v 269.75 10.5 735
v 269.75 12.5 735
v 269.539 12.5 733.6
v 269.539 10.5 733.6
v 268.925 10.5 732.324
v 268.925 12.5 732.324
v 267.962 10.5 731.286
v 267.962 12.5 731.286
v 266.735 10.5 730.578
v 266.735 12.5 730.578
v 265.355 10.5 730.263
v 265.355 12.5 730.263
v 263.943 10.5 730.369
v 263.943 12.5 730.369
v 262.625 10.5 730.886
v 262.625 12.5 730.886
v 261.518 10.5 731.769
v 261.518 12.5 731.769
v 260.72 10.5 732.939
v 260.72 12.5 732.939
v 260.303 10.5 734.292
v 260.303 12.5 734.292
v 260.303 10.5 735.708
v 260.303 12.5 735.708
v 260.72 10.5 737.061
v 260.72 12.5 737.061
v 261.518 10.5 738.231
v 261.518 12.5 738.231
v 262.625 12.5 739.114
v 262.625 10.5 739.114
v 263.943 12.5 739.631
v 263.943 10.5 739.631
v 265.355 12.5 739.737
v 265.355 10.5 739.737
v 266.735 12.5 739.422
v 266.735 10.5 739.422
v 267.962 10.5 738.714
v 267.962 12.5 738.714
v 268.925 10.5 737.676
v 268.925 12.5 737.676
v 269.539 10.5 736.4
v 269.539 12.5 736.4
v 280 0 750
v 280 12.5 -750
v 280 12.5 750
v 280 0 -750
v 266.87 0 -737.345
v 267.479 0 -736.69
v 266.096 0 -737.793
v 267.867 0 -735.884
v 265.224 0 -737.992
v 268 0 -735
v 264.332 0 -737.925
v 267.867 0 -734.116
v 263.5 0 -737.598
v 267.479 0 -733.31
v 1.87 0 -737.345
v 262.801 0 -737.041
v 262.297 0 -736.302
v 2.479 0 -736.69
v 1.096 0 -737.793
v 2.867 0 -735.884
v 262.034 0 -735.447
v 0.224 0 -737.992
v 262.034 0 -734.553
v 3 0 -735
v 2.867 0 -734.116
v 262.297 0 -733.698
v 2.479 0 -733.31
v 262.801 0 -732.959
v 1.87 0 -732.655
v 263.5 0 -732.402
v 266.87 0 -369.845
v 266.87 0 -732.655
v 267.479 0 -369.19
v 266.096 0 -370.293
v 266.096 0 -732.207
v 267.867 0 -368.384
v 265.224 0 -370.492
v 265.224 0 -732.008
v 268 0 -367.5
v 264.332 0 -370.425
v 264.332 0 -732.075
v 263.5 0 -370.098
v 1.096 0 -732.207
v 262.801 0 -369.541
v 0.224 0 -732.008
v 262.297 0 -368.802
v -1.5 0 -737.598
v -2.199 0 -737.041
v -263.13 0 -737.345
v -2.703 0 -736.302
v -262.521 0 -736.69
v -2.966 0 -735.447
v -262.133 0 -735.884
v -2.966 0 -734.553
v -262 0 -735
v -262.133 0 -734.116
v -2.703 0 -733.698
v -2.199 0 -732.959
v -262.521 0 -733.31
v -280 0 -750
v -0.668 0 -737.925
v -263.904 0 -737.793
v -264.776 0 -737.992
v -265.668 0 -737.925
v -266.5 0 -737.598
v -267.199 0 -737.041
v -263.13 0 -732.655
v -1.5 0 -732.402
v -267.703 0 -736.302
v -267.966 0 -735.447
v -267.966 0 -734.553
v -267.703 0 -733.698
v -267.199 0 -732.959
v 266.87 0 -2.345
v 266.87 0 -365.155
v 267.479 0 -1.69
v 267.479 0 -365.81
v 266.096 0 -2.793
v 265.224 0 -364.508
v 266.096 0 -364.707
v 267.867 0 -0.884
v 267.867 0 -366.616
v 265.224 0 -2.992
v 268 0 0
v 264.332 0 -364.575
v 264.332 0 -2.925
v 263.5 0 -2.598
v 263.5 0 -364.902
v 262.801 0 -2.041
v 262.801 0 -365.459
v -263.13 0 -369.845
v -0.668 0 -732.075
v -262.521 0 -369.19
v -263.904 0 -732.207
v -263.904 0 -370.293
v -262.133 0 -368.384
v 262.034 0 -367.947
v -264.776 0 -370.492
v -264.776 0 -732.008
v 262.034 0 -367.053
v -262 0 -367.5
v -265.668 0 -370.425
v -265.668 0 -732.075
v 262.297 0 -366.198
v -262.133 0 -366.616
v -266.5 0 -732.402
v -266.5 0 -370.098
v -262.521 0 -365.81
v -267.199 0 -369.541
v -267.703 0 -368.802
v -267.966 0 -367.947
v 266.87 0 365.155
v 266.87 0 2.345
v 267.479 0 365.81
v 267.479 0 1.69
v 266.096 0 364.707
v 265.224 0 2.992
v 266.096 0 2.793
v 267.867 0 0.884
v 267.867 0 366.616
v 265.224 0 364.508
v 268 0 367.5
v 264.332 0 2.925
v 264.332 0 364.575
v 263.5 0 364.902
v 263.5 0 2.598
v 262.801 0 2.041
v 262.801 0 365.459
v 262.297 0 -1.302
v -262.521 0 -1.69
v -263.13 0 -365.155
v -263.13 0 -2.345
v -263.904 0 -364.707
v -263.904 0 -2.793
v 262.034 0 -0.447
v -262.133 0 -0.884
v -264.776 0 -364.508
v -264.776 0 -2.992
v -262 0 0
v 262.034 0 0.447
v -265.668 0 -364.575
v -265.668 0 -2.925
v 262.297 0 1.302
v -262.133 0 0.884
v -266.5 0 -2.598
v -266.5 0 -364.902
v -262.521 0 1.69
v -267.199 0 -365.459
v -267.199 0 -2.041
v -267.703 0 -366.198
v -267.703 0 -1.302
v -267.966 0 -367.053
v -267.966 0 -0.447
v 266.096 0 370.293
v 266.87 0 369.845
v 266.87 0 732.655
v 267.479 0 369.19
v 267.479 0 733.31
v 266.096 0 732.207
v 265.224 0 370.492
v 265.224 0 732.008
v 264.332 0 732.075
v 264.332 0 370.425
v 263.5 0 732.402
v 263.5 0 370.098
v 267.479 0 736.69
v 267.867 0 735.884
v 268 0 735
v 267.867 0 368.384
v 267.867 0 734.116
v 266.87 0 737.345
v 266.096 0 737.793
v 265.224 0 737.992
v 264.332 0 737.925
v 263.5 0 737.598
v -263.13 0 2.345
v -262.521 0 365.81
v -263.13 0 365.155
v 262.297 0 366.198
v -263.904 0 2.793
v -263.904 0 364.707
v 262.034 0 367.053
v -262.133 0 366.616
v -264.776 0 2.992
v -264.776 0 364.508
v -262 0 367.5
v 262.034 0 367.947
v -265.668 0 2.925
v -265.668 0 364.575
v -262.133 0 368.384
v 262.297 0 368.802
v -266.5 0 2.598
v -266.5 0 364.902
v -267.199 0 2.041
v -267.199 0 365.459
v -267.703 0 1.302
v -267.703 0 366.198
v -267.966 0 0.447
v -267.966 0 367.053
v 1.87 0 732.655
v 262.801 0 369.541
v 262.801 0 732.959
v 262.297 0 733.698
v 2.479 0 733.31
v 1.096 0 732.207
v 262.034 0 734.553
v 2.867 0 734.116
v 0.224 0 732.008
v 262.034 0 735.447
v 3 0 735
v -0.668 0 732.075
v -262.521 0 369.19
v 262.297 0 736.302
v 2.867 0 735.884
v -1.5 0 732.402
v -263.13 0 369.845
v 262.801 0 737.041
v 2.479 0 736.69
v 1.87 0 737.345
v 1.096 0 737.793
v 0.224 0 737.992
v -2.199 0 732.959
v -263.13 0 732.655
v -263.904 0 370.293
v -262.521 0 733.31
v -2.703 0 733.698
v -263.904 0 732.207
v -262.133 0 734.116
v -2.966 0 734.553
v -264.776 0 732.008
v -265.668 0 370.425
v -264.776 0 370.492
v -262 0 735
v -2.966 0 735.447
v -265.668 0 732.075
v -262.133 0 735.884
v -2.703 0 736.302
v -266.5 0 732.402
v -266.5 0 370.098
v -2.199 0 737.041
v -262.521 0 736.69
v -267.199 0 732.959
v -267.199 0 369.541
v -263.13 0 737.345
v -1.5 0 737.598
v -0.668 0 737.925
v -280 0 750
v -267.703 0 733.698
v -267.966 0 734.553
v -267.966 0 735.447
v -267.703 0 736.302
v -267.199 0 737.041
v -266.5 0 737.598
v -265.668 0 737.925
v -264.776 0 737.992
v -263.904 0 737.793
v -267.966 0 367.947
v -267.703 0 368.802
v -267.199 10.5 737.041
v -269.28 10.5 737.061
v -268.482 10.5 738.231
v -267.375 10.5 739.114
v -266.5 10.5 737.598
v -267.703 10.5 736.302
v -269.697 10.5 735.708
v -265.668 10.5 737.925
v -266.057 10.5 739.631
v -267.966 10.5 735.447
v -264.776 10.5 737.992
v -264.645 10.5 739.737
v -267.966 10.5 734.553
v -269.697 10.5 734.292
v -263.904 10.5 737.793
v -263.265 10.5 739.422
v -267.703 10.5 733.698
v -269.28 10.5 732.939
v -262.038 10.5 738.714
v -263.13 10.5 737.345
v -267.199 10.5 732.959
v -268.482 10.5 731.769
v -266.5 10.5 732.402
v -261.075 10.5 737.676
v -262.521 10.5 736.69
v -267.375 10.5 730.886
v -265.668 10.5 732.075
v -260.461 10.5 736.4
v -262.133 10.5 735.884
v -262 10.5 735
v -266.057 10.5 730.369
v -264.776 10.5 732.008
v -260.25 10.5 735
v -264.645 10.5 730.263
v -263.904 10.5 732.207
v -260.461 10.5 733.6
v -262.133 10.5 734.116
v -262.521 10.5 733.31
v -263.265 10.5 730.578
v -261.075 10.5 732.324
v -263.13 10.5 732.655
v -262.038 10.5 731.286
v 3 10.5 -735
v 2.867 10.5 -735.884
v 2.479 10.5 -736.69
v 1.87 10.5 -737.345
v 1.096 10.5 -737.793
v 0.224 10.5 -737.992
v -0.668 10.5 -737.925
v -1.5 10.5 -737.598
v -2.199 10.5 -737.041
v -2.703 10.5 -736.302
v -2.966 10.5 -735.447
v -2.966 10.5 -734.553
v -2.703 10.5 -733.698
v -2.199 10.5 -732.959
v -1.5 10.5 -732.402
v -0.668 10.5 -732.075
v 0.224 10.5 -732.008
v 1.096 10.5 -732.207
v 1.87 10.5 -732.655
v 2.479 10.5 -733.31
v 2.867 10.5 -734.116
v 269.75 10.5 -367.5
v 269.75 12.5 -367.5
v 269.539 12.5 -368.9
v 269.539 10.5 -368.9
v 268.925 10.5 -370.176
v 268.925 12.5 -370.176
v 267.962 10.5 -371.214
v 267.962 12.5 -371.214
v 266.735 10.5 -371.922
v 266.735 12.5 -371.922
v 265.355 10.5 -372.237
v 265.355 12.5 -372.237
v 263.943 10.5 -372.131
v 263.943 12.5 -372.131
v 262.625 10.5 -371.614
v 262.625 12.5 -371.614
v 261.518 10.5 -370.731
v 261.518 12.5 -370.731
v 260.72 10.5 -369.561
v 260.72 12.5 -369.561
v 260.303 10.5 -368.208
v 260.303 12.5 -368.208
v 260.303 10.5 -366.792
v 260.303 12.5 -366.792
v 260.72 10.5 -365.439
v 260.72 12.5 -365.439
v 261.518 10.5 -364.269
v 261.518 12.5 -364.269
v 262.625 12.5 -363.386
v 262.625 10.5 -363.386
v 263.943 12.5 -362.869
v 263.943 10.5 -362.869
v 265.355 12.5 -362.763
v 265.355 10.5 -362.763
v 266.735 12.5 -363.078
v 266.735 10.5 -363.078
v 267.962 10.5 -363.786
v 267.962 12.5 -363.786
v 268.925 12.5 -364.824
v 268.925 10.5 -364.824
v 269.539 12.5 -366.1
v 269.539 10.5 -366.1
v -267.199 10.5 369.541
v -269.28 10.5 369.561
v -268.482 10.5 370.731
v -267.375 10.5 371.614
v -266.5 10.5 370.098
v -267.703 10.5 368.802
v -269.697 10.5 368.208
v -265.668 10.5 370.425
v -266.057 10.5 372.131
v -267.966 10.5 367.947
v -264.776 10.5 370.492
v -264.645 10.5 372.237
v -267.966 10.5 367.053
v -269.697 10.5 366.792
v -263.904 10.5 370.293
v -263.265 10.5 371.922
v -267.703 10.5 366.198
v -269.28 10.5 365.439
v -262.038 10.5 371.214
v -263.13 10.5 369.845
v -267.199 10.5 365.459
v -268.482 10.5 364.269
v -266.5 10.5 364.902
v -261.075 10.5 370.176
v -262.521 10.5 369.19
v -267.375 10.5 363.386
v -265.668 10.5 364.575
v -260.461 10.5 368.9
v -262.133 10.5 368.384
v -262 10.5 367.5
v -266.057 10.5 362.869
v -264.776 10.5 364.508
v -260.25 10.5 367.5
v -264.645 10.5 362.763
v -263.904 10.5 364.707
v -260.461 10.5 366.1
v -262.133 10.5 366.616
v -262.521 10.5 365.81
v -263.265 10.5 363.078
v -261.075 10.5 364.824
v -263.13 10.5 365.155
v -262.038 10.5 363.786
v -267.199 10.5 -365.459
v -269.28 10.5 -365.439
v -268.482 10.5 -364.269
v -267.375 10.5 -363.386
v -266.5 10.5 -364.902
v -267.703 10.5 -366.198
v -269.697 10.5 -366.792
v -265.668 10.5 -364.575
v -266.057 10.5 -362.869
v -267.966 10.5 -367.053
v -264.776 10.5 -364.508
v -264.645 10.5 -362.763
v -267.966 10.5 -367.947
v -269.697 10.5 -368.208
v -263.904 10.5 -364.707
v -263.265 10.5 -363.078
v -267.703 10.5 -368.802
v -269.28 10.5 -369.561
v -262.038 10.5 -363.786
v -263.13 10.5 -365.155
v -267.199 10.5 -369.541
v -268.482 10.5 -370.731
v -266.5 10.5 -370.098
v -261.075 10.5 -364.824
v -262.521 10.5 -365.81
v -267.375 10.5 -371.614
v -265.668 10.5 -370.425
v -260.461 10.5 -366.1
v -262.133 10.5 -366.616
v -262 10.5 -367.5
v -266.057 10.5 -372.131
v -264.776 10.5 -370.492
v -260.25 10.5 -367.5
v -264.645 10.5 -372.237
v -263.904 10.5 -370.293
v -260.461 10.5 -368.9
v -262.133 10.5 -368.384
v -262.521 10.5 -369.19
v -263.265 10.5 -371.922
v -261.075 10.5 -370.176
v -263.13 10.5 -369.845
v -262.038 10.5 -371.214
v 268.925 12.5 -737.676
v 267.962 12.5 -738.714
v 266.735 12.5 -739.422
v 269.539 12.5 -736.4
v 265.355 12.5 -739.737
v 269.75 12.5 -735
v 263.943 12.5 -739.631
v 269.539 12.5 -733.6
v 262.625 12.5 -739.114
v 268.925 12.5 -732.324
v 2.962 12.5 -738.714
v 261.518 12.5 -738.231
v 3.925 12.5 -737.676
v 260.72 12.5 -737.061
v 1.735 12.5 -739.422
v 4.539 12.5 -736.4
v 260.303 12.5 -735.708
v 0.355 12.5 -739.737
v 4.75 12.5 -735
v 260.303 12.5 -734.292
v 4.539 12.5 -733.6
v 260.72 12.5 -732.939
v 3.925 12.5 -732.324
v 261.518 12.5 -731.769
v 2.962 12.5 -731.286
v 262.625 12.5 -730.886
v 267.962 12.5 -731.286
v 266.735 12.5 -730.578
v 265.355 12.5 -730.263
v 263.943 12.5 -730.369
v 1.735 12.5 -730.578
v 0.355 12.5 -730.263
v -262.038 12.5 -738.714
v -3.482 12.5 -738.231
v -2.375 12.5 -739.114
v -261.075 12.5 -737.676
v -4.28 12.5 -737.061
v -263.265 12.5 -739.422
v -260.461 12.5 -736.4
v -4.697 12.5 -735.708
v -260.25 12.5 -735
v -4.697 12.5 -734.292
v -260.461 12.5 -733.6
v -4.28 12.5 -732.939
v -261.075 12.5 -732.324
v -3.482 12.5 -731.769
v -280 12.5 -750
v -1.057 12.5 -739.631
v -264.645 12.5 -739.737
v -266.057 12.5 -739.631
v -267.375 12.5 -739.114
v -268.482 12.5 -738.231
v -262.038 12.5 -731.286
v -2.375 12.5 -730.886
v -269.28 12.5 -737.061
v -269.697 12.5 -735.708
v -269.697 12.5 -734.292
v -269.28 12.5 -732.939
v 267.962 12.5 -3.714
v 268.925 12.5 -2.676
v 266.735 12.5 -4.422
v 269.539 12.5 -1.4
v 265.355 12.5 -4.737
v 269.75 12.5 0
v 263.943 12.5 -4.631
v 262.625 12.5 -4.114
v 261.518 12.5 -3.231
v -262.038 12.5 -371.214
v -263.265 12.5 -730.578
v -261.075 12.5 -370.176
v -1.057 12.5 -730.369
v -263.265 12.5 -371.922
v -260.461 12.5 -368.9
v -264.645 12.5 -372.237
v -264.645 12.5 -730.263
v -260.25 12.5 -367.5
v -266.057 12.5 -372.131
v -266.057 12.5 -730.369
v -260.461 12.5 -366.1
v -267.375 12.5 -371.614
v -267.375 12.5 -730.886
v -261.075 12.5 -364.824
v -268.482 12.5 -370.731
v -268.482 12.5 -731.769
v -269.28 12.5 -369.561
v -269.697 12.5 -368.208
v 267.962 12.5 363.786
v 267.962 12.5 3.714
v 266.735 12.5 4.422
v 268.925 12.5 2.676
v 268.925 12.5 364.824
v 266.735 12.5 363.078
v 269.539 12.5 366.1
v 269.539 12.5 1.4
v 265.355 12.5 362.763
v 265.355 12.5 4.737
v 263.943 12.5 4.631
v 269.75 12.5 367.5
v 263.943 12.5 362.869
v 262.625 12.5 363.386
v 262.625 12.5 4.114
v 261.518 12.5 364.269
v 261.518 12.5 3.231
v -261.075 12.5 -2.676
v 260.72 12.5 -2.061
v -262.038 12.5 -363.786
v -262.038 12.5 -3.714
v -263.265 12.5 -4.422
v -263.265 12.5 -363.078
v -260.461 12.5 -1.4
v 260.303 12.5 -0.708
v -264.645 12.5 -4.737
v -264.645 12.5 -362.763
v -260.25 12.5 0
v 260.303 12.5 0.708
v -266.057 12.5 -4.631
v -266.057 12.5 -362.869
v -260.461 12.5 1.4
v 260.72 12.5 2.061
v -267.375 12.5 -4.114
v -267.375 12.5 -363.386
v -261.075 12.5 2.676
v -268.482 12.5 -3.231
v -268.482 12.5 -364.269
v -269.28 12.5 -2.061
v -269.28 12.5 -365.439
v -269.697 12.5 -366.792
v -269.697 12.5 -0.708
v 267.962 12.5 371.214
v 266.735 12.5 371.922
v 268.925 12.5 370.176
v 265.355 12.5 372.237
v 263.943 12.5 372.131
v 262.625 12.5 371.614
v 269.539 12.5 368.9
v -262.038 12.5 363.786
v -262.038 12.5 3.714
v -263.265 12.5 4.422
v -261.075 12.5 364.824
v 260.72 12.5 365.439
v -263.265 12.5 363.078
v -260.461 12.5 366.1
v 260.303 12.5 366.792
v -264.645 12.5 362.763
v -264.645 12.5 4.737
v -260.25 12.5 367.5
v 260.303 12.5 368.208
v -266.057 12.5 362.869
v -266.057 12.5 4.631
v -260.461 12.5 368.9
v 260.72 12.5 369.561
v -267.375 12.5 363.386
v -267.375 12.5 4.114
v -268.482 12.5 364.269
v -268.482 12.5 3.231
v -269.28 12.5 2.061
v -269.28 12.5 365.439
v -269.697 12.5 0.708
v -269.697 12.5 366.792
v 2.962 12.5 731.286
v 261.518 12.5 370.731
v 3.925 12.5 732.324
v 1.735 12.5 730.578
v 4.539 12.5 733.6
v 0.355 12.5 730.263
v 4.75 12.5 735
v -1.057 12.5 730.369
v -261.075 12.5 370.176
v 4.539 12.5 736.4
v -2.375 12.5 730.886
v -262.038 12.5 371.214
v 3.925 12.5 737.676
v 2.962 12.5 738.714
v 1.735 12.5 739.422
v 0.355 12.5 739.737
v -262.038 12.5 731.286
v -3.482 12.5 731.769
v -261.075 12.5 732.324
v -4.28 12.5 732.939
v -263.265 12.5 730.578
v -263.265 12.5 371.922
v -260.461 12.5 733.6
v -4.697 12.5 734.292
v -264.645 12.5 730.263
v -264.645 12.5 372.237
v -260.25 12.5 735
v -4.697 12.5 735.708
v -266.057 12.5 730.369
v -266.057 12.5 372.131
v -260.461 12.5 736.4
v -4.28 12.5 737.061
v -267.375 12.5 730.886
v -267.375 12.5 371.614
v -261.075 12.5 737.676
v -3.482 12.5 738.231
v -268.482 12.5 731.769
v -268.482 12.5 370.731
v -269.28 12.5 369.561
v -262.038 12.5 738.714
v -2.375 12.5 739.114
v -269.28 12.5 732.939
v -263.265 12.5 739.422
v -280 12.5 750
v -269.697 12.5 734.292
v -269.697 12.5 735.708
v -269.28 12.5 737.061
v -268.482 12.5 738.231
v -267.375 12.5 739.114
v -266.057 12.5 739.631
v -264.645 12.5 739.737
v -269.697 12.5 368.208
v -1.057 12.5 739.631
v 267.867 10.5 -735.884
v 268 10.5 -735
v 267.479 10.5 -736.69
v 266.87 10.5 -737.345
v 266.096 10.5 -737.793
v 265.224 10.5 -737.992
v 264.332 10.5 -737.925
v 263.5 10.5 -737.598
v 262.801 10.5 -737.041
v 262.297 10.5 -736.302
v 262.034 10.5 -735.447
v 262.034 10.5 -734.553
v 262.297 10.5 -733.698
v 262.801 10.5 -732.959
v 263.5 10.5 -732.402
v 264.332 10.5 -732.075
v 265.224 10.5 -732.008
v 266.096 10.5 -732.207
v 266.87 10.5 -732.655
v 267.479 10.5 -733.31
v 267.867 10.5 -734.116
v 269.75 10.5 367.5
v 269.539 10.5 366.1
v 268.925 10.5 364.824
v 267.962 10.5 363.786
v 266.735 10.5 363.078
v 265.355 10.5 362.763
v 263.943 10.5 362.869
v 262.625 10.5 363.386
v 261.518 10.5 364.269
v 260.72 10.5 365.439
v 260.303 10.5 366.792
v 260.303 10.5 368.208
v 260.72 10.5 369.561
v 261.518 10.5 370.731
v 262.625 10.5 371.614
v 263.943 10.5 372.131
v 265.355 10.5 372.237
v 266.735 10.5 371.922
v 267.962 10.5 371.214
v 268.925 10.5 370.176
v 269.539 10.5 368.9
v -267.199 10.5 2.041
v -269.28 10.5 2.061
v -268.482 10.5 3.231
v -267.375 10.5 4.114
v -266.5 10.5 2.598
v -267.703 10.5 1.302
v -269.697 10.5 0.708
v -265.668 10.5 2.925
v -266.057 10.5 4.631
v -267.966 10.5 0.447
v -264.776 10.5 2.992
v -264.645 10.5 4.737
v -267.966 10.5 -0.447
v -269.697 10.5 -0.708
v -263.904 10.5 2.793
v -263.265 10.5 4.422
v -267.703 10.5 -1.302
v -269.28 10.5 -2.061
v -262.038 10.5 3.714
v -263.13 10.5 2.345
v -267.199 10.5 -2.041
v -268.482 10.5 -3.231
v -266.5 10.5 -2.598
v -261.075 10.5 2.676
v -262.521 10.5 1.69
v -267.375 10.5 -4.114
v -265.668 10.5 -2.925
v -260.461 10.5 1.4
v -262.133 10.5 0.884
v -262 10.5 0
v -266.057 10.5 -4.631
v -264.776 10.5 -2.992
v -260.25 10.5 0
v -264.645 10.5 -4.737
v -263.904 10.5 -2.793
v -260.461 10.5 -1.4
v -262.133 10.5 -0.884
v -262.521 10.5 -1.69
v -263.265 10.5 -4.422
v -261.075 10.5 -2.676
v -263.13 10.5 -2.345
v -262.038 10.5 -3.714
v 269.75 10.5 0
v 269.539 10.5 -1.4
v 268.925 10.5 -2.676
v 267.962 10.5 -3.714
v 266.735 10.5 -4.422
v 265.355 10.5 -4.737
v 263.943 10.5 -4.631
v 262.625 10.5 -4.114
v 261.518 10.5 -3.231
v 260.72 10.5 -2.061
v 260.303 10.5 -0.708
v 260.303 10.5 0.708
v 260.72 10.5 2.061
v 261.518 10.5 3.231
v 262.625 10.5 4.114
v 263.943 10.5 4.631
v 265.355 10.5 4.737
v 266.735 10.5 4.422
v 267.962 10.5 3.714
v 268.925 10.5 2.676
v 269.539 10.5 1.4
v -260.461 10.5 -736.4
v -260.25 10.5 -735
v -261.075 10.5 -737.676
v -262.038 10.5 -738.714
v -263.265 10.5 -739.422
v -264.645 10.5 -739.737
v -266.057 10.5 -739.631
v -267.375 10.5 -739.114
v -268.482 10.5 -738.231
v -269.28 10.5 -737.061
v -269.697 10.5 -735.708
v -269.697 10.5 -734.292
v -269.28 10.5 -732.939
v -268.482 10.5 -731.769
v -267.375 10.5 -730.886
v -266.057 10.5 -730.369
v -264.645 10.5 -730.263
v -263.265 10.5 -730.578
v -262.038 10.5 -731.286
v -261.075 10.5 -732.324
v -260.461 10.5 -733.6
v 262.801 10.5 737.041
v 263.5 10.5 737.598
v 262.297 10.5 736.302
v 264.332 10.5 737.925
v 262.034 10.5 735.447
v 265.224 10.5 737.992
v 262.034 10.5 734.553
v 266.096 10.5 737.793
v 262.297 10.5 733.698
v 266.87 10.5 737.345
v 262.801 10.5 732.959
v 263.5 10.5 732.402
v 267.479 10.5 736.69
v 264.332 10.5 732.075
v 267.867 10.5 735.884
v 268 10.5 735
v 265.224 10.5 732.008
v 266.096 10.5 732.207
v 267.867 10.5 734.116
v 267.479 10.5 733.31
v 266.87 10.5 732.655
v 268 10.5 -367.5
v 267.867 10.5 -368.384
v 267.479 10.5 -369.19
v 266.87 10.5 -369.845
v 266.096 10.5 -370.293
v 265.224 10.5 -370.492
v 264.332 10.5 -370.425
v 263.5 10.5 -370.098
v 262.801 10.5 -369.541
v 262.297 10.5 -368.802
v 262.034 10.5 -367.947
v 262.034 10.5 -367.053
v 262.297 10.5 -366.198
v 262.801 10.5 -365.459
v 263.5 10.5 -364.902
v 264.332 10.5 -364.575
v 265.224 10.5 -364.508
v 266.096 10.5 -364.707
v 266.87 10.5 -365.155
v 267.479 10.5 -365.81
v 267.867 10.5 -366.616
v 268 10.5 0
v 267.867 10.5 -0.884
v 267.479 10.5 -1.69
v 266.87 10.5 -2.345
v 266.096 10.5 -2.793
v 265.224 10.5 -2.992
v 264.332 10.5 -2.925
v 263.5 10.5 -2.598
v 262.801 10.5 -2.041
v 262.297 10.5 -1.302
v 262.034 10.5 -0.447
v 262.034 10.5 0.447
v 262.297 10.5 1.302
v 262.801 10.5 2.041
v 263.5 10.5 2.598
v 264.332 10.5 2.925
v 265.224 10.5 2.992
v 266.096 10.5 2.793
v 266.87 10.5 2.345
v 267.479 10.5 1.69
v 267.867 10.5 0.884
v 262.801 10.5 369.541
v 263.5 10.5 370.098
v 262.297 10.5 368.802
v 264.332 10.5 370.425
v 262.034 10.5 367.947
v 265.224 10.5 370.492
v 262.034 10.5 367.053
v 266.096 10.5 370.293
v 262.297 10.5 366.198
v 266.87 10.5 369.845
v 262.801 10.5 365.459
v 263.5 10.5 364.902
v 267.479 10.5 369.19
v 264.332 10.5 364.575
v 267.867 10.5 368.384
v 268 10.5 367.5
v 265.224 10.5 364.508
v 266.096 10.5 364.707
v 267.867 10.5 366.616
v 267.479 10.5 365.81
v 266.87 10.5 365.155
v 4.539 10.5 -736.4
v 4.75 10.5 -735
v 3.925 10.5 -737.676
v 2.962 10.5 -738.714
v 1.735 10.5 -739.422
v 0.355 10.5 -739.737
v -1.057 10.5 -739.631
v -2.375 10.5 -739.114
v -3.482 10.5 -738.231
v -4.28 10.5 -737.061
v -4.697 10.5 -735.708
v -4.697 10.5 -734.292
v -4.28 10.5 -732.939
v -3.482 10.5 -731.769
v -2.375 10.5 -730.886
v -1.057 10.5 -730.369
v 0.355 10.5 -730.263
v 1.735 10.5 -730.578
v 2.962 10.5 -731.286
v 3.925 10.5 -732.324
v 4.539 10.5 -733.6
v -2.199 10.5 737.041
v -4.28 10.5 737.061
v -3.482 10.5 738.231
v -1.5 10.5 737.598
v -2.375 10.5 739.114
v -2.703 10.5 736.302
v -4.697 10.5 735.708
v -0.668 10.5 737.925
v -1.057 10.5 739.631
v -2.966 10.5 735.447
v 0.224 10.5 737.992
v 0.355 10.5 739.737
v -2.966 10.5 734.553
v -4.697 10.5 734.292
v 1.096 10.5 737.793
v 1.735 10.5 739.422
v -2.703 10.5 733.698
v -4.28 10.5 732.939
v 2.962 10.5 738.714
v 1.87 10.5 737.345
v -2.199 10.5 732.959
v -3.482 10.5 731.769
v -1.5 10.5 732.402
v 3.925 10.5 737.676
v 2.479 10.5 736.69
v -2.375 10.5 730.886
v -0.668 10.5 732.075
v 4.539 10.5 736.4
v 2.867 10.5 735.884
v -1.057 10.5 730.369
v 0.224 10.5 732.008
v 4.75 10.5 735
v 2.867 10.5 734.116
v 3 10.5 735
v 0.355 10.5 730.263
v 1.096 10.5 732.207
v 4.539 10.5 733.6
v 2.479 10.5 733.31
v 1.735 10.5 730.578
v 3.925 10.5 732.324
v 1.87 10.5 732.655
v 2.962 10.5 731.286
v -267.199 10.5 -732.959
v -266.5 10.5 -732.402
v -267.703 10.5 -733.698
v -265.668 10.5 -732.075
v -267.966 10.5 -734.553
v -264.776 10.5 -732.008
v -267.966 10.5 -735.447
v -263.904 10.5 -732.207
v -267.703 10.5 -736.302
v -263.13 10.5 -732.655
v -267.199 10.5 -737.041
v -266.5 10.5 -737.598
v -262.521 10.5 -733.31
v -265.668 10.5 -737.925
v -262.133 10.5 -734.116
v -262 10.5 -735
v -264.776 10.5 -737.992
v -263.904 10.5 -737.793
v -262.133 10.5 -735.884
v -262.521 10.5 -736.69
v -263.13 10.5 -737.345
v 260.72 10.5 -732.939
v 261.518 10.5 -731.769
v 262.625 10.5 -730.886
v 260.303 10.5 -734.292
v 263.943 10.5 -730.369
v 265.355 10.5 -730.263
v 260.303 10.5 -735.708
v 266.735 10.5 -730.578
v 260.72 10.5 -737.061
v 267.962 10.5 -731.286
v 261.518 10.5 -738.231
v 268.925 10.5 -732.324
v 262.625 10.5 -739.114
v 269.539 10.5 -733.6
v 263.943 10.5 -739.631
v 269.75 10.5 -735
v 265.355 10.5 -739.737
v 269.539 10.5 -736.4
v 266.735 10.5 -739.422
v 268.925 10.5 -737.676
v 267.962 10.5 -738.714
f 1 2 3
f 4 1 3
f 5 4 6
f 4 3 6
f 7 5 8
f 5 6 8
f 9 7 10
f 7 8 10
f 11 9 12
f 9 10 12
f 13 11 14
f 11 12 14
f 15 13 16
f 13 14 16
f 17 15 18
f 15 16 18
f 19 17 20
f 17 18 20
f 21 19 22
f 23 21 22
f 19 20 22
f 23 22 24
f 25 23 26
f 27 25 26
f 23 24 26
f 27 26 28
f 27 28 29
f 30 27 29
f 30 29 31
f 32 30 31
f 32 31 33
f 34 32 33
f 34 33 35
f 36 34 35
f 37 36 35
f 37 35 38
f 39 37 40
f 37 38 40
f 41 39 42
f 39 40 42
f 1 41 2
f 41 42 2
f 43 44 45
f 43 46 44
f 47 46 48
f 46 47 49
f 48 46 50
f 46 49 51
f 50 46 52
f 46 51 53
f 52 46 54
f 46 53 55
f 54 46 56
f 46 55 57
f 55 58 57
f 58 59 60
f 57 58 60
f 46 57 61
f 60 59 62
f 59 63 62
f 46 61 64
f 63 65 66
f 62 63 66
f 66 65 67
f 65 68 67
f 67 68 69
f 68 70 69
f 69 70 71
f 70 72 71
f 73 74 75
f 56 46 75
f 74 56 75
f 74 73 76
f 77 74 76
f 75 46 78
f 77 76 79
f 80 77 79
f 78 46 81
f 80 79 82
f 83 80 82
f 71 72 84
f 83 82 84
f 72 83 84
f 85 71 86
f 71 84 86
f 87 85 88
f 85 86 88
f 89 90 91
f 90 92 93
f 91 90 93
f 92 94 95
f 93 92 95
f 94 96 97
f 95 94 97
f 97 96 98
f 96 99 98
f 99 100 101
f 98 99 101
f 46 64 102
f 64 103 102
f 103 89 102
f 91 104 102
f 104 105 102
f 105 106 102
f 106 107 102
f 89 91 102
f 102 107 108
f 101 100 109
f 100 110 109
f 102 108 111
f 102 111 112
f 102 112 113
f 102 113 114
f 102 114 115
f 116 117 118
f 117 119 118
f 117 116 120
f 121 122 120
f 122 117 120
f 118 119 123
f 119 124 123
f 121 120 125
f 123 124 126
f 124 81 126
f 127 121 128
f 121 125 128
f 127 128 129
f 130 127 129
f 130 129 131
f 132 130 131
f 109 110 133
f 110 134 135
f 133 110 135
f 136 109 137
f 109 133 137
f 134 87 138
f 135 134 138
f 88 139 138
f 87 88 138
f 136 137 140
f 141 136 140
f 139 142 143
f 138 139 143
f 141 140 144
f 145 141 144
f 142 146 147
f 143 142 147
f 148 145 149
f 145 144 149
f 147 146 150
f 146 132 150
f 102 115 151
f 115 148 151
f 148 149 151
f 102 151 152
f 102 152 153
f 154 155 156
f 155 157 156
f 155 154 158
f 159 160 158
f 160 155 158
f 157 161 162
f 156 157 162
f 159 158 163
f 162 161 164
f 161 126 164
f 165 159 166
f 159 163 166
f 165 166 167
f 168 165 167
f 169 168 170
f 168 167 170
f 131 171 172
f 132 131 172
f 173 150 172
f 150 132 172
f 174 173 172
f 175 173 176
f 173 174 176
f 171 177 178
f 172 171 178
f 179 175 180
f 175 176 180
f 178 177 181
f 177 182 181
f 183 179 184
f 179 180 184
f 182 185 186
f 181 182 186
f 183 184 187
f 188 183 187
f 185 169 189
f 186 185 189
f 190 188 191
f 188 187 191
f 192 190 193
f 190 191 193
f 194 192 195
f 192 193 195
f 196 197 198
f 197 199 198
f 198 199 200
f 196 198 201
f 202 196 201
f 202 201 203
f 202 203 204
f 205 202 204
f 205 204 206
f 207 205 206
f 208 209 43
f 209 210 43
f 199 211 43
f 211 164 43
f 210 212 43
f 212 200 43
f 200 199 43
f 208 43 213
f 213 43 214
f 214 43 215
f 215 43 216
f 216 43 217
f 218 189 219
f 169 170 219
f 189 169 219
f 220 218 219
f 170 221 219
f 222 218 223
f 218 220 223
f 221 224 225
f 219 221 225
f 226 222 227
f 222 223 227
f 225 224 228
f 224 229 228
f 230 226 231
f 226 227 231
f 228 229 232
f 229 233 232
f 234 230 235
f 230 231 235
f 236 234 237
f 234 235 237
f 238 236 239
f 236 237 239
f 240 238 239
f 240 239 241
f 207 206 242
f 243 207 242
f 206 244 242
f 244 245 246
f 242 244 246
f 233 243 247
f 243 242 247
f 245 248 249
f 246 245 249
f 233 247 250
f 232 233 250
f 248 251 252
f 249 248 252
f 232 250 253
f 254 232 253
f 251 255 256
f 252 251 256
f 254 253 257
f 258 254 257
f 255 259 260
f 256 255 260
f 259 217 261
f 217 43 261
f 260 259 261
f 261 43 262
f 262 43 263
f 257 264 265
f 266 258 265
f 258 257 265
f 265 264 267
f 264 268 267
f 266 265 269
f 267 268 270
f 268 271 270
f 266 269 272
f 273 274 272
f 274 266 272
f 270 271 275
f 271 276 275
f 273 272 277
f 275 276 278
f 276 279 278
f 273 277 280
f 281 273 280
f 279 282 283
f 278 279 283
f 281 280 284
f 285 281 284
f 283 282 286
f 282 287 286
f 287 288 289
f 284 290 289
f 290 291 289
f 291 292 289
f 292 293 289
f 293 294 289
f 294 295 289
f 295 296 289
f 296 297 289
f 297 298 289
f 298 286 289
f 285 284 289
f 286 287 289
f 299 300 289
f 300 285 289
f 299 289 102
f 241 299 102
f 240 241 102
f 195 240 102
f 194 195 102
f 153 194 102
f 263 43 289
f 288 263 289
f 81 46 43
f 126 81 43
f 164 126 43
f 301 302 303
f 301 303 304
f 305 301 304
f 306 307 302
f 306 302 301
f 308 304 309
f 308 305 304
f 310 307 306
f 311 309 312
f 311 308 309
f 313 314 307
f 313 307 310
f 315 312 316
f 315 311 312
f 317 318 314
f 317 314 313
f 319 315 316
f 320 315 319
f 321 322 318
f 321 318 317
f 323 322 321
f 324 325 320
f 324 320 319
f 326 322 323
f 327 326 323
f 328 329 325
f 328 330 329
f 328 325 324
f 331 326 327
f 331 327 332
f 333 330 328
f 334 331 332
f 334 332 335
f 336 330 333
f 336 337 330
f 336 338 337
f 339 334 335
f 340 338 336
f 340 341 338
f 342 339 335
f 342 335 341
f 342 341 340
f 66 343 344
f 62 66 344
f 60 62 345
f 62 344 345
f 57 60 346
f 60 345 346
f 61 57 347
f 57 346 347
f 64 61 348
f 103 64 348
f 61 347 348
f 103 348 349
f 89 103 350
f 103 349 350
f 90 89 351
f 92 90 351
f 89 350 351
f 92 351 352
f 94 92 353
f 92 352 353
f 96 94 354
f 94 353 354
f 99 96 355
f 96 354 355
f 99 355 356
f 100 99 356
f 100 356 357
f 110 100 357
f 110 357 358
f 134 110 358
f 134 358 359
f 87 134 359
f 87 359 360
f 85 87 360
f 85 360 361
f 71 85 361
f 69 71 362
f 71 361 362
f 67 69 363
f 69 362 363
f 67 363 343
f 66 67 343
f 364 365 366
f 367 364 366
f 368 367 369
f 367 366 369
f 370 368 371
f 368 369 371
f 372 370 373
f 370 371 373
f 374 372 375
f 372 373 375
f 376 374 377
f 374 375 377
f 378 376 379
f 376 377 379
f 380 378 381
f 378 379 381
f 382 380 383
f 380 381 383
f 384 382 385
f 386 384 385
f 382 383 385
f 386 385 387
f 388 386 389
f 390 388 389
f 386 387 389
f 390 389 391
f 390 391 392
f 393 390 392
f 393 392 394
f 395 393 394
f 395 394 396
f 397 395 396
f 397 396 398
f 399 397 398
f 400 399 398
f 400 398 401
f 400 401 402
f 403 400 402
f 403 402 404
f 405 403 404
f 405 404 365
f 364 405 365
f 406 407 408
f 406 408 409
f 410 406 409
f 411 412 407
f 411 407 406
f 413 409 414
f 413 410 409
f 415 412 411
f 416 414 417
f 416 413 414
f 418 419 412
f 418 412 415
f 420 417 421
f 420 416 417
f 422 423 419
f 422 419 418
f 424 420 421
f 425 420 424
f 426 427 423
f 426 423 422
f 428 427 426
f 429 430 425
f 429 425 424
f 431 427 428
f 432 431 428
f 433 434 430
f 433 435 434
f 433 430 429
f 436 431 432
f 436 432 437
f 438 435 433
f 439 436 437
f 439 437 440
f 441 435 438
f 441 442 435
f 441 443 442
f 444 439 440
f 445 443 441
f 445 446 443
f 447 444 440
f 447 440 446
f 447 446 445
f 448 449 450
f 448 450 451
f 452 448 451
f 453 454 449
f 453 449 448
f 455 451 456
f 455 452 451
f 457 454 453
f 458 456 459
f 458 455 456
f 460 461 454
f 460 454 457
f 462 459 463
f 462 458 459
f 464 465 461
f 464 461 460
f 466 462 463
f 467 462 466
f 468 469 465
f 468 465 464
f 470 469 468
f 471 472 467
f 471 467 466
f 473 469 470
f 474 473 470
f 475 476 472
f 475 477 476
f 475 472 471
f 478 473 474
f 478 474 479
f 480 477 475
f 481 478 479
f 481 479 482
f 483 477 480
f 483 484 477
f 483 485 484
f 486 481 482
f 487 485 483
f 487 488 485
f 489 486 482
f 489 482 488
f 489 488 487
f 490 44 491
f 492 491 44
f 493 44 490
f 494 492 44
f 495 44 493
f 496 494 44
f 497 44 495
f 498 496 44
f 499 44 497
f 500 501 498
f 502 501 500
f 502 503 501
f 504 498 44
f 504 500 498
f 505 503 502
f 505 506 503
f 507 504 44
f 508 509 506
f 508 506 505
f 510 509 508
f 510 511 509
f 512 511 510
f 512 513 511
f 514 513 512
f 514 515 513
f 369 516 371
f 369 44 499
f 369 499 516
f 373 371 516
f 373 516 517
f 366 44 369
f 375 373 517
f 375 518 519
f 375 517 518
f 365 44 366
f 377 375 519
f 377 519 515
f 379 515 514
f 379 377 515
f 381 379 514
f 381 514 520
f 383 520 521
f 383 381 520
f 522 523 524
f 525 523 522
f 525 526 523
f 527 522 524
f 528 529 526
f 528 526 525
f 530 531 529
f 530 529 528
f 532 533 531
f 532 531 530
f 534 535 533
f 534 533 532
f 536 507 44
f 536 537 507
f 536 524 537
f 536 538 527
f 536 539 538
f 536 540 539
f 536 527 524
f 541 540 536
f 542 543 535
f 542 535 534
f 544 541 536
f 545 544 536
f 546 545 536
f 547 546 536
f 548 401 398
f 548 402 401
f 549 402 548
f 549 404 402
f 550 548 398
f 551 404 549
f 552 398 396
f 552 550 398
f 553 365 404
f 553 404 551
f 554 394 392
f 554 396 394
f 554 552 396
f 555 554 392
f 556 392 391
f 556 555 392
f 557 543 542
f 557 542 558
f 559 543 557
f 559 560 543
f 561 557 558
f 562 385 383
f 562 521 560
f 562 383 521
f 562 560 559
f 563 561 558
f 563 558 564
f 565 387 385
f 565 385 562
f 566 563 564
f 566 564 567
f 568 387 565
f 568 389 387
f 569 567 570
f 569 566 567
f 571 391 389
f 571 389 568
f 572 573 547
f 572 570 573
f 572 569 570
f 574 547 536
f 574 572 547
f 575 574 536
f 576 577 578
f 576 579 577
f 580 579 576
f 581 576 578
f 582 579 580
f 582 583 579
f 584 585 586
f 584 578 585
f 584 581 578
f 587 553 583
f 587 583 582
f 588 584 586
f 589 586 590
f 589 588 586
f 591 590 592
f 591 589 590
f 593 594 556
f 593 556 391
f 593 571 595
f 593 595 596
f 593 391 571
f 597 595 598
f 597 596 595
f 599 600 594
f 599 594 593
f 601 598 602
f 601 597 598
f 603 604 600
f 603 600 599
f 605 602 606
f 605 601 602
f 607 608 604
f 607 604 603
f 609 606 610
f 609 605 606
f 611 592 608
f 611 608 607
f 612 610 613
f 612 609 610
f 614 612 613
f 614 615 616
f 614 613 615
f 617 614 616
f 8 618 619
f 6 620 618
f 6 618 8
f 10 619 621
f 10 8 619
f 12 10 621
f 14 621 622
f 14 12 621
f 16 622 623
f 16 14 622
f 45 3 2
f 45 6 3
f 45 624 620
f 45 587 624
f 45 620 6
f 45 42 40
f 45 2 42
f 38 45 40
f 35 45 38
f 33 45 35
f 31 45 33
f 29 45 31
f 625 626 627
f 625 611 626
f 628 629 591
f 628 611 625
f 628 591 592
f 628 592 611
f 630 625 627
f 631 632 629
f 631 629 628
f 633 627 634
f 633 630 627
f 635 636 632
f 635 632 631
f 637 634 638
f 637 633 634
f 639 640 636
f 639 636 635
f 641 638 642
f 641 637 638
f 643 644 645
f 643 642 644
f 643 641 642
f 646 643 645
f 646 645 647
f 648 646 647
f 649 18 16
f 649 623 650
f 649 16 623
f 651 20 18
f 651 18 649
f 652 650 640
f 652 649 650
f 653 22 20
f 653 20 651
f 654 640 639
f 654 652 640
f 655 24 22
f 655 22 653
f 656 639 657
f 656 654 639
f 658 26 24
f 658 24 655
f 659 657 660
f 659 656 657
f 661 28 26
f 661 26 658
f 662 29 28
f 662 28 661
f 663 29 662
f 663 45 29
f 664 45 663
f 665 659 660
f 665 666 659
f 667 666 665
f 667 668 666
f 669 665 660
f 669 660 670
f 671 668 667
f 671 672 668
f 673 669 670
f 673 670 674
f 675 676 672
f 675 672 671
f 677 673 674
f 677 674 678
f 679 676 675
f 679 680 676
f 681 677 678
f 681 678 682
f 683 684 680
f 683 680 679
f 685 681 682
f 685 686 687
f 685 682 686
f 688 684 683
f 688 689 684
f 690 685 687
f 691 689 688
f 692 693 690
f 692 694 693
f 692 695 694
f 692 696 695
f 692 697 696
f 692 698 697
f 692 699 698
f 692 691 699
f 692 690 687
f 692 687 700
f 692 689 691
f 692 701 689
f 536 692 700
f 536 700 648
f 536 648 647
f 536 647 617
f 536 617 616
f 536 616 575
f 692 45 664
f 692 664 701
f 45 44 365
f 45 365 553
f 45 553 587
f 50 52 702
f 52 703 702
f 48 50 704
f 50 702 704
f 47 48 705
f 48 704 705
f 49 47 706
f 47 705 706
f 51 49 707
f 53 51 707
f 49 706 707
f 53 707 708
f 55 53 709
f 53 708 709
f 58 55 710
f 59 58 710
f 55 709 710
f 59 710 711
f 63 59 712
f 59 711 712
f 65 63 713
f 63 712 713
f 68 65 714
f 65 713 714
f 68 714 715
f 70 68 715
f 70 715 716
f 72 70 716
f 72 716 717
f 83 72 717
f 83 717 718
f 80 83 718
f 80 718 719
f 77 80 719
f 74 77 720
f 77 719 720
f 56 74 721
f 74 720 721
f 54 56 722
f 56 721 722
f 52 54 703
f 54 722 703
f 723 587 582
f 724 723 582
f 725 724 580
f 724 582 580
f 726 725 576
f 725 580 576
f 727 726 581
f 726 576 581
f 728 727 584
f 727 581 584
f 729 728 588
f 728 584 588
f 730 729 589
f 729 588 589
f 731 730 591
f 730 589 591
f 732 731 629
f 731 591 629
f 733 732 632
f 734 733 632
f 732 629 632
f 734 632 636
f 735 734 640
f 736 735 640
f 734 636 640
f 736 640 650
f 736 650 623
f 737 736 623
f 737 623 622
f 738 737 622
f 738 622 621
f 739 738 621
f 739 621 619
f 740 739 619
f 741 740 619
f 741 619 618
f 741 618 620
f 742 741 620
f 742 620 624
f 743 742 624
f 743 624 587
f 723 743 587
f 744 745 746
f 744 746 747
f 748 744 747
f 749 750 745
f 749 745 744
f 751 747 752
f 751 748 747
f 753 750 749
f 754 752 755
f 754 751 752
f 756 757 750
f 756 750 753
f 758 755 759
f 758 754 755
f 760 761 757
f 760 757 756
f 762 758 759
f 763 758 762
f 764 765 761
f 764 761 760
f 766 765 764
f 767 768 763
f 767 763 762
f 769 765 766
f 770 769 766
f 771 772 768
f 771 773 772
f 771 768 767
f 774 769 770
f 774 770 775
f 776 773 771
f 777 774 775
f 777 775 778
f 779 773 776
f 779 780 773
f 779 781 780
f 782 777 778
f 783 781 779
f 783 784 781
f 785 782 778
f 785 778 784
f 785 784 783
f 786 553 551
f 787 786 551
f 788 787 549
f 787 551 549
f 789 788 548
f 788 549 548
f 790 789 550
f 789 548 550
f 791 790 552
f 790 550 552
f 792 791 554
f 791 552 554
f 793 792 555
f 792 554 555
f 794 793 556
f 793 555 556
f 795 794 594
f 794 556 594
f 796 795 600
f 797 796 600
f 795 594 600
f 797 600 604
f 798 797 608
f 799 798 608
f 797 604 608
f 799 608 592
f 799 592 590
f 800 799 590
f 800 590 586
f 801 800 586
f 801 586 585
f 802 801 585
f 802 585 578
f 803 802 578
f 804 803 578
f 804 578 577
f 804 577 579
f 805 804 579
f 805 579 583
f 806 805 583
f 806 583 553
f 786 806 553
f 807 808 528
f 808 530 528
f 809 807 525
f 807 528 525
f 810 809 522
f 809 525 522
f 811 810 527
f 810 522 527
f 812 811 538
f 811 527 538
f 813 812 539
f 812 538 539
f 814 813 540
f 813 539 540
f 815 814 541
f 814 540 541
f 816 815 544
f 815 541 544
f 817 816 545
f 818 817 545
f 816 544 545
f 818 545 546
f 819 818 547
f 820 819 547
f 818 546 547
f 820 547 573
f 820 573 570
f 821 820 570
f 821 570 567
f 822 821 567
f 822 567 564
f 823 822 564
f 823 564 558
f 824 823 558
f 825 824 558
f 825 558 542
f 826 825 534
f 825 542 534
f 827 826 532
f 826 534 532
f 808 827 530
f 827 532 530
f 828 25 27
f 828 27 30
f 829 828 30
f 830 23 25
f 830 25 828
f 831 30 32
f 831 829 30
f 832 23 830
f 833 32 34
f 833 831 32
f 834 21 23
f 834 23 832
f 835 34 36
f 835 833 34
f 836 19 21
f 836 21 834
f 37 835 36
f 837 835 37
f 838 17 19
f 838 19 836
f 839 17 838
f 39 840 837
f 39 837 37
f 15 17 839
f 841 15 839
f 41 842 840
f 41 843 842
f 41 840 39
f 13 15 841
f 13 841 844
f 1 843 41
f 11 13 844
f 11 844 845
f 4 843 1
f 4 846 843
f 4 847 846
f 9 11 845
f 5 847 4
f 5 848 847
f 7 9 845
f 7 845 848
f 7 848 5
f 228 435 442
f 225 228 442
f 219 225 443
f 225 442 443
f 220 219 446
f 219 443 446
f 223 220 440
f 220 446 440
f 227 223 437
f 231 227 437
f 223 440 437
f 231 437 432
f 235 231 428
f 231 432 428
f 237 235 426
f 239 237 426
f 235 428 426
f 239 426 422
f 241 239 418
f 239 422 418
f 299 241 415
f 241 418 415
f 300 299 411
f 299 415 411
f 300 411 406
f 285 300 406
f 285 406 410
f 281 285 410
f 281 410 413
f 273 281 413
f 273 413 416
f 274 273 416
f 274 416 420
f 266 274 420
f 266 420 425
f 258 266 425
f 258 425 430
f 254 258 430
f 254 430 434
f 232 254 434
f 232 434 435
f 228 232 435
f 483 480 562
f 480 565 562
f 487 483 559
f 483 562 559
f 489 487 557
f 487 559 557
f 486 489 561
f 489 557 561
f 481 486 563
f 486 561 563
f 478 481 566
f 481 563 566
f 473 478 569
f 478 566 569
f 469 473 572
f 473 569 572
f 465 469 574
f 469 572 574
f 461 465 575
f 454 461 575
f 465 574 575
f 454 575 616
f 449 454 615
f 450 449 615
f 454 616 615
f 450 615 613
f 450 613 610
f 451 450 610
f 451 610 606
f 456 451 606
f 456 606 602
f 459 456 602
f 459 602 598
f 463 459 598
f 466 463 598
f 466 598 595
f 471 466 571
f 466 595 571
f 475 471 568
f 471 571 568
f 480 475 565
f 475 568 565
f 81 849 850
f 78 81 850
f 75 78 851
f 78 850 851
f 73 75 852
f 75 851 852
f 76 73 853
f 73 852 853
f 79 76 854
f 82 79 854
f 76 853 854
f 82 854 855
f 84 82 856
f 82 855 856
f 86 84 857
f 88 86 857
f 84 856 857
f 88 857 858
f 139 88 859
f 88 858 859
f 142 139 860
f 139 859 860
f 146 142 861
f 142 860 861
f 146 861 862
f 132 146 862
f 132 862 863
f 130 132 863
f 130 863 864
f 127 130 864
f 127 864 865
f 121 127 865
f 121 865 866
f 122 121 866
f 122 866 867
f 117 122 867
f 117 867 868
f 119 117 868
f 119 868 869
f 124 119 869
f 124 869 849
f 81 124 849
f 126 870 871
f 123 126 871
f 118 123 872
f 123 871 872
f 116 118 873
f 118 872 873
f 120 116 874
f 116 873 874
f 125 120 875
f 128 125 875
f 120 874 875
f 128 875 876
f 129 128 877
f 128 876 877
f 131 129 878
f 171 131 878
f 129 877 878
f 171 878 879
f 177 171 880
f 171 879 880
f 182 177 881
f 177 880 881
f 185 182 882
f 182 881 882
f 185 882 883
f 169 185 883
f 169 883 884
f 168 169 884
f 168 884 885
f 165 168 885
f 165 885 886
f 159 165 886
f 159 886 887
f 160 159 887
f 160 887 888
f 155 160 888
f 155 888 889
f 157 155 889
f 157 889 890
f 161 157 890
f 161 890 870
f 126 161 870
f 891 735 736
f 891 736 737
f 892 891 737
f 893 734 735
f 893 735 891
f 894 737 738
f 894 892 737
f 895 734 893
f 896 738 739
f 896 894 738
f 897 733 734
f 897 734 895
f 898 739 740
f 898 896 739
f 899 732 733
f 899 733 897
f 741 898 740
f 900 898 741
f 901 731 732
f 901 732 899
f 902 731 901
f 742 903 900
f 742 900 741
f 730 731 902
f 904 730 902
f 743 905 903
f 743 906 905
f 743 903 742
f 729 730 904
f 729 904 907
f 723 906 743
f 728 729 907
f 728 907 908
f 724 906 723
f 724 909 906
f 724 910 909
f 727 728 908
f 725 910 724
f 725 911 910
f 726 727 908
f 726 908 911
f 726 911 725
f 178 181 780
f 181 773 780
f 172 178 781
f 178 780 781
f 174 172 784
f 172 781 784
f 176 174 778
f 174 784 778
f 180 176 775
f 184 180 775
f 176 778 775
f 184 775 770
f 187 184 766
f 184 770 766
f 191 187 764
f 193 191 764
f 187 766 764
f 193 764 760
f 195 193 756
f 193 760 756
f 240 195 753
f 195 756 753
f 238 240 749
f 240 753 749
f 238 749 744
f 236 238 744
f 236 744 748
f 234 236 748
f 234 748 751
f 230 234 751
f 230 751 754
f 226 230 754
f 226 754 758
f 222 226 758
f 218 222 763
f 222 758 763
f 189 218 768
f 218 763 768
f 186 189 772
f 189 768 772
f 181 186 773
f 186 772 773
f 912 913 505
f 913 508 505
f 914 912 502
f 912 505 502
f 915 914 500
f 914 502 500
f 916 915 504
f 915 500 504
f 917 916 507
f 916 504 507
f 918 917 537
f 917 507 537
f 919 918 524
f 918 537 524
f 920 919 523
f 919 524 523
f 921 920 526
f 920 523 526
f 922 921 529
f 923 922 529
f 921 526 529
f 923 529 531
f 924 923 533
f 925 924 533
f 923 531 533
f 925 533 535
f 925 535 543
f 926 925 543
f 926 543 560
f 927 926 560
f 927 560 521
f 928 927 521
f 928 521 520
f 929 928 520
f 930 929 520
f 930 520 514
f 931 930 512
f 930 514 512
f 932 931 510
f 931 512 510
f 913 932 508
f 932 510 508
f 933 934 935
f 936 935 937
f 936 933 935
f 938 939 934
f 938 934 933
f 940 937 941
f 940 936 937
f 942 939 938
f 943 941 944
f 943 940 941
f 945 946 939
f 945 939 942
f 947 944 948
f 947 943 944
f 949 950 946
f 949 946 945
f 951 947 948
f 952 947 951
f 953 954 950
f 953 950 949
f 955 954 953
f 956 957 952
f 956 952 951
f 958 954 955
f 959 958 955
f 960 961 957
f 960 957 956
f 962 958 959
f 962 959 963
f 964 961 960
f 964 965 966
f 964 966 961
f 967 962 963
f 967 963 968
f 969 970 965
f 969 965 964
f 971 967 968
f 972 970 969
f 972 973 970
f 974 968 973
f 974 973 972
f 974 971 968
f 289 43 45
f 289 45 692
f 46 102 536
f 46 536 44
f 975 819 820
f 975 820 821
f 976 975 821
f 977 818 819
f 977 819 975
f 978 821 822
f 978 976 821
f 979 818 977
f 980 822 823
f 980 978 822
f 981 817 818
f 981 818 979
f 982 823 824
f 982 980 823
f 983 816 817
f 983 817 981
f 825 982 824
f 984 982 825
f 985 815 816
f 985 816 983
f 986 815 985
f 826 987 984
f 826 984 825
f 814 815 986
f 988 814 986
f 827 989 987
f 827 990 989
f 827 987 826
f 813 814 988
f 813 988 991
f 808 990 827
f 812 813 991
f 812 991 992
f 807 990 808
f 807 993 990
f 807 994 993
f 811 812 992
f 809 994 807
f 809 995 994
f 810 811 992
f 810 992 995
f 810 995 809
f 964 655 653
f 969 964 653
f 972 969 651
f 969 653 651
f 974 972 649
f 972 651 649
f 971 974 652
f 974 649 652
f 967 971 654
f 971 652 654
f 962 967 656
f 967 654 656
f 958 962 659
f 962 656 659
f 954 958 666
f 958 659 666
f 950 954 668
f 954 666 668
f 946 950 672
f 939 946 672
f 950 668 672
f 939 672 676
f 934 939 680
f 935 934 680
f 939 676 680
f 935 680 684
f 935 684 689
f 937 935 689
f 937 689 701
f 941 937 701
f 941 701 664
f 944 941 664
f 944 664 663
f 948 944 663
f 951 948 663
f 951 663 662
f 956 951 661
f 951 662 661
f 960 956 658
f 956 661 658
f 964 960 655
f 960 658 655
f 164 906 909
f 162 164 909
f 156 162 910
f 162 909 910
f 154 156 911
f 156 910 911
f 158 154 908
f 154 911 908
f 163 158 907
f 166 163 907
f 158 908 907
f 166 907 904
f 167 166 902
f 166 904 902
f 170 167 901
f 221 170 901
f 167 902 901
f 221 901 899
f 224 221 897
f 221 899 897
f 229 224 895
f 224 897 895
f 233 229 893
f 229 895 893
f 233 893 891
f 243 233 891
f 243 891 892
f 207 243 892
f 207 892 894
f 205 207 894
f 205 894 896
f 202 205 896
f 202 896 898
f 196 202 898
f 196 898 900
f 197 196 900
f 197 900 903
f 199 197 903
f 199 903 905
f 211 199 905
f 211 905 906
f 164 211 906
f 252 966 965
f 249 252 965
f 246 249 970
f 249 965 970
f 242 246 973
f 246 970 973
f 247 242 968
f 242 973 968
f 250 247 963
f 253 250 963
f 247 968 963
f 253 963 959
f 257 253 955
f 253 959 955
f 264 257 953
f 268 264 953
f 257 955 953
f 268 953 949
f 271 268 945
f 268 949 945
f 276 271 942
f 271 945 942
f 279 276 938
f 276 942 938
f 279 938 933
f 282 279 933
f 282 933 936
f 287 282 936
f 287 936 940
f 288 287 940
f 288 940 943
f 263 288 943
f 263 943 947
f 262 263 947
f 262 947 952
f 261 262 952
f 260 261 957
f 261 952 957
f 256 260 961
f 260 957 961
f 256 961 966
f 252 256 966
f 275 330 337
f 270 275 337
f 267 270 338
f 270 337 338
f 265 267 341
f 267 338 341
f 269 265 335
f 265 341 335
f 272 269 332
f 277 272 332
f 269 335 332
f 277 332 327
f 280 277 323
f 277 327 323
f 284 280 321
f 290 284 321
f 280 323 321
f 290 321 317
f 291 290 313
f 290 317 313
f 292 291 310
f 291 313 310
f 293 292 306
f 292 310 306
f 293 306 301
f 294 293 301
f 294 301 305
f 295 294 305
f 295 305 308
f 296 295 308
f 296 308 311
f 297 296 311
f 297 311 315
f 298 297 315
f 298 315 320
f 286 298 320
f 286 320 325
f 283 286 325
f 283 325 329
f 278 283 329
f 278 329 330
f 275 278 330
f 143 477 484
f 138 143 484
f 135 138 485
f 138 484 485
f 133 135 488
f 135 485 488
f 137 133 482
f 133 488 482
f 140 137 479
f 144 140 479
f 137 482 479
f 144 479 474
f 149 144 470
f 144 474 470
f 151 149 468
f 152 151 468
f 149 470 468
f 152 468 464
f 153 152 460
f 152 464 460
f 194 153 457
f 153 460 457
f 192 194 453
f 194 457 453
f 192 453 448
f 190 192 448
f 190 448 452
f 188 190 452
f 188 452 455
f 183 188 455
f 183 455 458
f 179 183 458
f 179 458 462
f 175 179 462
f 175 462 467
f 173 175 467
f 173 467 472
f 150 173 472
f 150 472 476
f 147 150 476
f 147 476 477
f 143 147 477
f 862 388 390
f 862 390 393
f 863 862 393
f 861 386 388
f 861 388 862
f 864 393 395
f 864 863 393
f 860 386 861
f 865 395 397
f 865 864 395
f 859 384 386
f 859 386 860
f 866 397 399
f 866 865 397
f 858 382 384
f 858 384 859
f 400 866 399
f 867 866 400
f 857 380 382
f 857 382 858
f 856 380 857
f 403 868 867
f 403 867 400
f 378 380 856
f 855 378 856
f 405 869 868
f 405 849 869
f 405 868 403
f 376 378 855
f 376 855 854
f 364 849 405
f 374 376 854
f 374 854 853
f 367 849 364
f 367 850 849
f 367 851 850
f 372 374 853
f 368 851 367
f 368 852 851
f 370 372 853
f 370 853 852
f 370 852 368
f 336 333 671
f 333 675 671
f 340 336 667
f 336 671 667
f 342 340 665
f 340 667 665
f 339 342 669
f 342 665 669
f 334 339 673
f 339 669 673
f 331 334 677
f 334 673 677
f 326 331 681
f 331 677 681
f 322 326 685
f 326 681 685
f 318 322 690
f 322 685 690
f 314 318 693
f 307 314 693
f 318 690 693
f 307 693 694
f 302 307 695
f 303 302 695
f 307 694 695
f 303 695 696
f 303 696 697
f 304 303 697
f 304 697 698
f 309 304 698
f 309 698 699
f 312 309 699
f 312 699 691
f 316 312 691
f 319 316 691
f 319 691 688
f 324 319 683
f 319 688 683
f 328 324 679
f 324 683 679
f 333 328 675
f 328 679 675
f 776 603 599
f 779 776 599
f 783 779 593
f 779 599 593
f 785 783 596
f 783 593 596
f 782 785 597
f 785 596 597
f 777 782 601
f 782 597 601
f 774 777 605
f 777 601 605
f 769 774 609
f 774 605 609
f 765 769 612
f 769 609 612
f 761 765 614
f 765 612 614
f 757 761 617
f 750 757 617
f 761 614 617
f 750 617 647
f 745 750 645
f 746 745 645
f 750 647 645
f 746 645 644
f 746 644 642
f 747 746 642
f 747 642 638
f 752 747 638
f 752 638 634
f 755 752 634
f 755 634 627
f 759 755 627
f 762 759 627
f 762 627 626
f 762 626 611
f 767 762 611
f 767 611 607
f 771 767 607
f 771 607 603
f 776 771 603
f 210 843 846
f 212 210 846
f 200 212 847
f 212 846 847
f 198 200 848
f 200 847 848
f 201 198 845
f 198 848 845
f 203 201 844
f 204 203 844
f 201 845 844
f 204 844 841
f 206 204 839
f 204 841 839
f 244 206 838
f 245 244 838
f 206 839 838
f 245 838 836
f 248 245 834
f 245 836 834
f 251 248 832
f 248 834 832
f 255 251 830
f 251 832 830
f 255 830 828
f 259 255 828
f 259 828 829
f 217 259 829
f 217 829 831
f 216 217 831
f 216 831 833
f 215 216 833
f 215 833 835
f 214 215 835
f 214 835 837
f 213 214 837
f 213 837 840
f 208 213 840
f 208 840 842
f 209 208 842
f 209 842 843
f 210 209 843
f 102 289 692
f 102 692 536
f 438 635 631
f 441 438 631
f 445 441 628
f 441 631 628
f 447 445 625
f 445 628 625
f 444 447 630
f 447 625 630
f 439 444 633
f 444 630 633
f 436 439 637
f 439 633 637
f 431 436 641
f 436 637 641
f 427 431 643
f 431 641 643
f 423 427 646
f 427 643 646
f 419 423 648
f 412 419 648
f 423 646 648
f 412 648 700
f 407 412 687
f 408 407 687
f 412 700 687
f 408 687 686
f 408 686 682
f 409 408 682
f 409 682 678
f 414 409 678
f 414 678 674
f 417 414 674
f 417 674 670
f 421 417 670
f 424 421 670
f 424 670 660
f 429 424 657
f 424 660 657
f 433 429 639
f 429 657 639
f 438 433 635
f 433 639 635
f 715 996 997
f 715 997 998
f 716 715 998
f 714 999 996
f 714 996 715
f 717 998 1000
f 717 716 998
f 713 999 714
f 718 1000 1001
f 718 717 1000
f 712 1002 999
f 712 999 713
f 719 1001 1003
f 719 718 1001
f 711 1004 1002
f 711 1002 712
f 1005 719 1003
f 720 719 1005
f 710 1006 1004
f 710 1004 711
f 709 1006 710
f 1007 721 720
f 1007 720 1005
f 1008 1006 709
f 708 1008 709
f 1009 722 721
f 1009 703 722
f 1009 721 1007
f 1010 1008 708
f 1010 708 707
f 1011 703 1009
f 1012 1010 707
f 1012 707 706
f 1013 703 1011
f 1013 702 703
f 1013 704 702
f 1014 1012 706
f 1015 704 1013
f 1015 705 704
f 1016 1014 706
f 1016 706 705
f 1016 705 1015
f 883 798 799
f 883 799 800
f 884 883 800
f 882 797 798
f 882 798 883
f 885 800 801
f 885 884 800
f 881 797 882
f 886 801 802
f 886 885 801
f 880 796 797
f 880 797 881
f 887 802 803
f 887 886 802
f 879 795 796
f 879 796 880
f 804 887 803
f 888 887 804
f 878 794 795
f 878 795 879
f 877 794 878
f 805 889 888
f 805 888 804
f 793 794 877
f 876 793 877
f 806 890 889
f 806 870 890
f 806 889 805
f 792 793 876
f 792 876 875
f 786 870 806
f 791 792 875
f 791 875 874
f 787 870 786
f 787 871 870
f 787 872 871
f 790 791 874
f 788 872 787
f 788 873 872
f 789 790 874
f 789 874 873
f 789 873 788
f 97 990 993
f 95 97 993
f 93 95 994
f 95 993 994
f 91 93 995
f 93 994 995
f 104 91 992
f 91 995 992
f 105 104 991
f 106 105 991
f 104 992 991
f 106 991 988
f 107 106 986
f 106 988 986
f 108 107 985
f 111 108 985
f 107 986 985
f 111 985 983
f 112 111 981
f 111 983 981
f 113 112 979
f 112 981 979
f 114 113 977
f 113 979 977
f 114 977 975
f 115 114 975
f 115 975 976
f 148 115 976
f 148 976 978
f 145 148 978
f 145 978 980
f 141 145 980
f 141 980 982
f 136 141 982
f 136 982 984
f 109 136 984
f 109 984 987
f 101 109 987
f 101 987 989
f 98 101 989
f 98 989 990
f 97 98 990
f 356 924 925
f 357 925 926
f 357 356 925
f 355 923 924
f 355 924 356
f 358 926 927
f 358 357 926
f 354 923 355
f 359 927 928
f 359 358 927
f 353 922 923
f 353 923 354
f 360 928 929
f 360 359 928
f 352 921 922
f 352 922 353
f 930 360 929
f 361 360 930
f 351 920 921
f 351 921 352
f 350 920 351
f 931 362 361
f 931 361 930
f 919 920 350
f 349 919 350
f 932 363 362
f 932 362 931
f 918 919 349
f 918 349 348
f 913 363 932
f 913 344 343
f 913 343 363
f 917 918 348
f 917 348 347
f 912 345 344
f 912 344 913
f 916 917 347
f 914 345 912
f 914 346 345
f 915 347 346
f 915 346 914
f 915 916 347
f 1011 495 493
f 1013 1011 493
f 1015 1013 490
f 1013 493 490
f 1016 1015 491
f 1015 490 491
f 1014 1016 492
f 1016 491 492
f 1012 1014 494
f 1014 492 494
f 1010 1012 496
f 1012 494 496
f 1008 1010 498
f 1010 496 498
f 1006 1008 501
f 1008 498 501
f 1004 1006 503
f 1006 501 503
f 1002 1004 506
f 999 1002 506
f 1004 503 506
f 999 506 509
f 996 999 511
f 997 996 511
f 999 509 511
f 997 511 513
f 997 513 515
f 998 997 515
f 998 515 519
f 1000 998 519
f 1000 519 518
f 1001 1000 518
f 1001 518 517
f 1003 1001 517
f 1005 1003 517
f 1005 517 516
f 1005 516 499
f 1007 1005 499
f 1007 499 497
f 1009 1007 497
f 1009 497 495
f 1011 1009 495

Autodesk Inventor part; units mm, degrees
ref_plane "YZ Plane" through (0, 0, 0) normal (1, 0, 0) x (0, 1, 0)
ref_plane "XZ Plane" through (0, 0, 0) normal (0, 1, 0) x (-1, 0, 0)
ref_plane "XY Plane" through (0, 0, 0) normal (0, 0, 1) x (1, 0, 0)
sketch "Sketch1" plane through (0, 0, 0) normal (0, 1, 0) x (-1, 0, 0)
  line L0 (-280, 750) -> (280, 750)
  line L1 (280, 750) -> (280, -750)
  line L2 (280, -750) -> (-280, -750)
  line L3 (-280, -750) -> (-280, 750)
  line L4 (-280, 750) -> (280, -750) construction
  line L5 (280, 750) -> (-280, -750) construction
  point P0 (0, 0)
  dimension "d0" = 1500
  dimension "d1" = 560
extrude "Extrusion1" add sketch "Sketch1" along normal blind 12.5
sketch "Sketch2" plane through (0, 12.5, 0) normal (0, 1, 0) x (1, 0, 0)
  circle A0 centre (-265, -735) radius 3
  line L0 (-280, 750) -> (-280, -750) projected
  line L1 (280, -750) -> (280, 750) projected
  line L2 (-280, -750) -> (280, -750) projected
  dimension "d4" = 6
  dimension "d5" = 15
  dimension "d7" = 15
extrude "Extrusion2" cut sketch "Sketch2" against normal through all
pattern_linear "Rectangular Pattern1" count 5 spacing 367.5 along (0, 0, -1) count 2 spacing 530 along (1, 0, 0) of "Extrusion2"
sketch "Sketch3" plane through (0, 12.5, 0) normal (0, 1, 0) x (1, 0, 0)
  circle A0 centre (0, -735) radius 3
  circle A1 centre (0, 735) radius 3
  line L0 (280, 750) -> (-280, 750) projected
  line L1 (-280, -750) -> (280, -750) projected
  point P0 (0, 0)
  dimension "d16" = 6
  dimension "d17" = 15
  dimension "d18" = 15
  dimension "d19" = 6
extrude "Extrusion3" cut sketch "Sketch3" against normal through all
sketch "Sketch4" plane through (0, 12.5, 0) normal (0, 1, 0) x (1, 0, 0)
  circle A0 centre (-265, -735) radius 3 projected
  circle A1 centre (-265, -735) radius 4.75
  point P0 (0, 0)
  dimension "d22" = 9.5
extrude "Extrusion4" cut sketch "Sketch4" against normal blind 2 contours A0 | A1
pattern_linear "Rectangular Pattern2" count 5 spacing 367.5 along (0, 0, -1) count 2 spacing 530 along (1, 0, 0) of "Extrusion4"
sketch "Sketch5" plane through (0, 12.5, 0) normal (0, 1, 0) x (1, 0, 0)
  circle A0 centre (0, -735) radius 3 projected
  circle A1 centre (0, -735) radius 4.75
  circle A2 centre (0, 735) radius 3 projected
  circle A3 centre (0, 735) radius 4.75
  point P0 (0, 0)
  dimension "d31" = 9.5
  dimension "d32" = 9.5
extrude "Extrusion5" cut sketch "Sketch5" against normal blind 2 contours A0 | A1 | A2 | A3
properties part number "Cobertura" material "Wood (Oak)"
